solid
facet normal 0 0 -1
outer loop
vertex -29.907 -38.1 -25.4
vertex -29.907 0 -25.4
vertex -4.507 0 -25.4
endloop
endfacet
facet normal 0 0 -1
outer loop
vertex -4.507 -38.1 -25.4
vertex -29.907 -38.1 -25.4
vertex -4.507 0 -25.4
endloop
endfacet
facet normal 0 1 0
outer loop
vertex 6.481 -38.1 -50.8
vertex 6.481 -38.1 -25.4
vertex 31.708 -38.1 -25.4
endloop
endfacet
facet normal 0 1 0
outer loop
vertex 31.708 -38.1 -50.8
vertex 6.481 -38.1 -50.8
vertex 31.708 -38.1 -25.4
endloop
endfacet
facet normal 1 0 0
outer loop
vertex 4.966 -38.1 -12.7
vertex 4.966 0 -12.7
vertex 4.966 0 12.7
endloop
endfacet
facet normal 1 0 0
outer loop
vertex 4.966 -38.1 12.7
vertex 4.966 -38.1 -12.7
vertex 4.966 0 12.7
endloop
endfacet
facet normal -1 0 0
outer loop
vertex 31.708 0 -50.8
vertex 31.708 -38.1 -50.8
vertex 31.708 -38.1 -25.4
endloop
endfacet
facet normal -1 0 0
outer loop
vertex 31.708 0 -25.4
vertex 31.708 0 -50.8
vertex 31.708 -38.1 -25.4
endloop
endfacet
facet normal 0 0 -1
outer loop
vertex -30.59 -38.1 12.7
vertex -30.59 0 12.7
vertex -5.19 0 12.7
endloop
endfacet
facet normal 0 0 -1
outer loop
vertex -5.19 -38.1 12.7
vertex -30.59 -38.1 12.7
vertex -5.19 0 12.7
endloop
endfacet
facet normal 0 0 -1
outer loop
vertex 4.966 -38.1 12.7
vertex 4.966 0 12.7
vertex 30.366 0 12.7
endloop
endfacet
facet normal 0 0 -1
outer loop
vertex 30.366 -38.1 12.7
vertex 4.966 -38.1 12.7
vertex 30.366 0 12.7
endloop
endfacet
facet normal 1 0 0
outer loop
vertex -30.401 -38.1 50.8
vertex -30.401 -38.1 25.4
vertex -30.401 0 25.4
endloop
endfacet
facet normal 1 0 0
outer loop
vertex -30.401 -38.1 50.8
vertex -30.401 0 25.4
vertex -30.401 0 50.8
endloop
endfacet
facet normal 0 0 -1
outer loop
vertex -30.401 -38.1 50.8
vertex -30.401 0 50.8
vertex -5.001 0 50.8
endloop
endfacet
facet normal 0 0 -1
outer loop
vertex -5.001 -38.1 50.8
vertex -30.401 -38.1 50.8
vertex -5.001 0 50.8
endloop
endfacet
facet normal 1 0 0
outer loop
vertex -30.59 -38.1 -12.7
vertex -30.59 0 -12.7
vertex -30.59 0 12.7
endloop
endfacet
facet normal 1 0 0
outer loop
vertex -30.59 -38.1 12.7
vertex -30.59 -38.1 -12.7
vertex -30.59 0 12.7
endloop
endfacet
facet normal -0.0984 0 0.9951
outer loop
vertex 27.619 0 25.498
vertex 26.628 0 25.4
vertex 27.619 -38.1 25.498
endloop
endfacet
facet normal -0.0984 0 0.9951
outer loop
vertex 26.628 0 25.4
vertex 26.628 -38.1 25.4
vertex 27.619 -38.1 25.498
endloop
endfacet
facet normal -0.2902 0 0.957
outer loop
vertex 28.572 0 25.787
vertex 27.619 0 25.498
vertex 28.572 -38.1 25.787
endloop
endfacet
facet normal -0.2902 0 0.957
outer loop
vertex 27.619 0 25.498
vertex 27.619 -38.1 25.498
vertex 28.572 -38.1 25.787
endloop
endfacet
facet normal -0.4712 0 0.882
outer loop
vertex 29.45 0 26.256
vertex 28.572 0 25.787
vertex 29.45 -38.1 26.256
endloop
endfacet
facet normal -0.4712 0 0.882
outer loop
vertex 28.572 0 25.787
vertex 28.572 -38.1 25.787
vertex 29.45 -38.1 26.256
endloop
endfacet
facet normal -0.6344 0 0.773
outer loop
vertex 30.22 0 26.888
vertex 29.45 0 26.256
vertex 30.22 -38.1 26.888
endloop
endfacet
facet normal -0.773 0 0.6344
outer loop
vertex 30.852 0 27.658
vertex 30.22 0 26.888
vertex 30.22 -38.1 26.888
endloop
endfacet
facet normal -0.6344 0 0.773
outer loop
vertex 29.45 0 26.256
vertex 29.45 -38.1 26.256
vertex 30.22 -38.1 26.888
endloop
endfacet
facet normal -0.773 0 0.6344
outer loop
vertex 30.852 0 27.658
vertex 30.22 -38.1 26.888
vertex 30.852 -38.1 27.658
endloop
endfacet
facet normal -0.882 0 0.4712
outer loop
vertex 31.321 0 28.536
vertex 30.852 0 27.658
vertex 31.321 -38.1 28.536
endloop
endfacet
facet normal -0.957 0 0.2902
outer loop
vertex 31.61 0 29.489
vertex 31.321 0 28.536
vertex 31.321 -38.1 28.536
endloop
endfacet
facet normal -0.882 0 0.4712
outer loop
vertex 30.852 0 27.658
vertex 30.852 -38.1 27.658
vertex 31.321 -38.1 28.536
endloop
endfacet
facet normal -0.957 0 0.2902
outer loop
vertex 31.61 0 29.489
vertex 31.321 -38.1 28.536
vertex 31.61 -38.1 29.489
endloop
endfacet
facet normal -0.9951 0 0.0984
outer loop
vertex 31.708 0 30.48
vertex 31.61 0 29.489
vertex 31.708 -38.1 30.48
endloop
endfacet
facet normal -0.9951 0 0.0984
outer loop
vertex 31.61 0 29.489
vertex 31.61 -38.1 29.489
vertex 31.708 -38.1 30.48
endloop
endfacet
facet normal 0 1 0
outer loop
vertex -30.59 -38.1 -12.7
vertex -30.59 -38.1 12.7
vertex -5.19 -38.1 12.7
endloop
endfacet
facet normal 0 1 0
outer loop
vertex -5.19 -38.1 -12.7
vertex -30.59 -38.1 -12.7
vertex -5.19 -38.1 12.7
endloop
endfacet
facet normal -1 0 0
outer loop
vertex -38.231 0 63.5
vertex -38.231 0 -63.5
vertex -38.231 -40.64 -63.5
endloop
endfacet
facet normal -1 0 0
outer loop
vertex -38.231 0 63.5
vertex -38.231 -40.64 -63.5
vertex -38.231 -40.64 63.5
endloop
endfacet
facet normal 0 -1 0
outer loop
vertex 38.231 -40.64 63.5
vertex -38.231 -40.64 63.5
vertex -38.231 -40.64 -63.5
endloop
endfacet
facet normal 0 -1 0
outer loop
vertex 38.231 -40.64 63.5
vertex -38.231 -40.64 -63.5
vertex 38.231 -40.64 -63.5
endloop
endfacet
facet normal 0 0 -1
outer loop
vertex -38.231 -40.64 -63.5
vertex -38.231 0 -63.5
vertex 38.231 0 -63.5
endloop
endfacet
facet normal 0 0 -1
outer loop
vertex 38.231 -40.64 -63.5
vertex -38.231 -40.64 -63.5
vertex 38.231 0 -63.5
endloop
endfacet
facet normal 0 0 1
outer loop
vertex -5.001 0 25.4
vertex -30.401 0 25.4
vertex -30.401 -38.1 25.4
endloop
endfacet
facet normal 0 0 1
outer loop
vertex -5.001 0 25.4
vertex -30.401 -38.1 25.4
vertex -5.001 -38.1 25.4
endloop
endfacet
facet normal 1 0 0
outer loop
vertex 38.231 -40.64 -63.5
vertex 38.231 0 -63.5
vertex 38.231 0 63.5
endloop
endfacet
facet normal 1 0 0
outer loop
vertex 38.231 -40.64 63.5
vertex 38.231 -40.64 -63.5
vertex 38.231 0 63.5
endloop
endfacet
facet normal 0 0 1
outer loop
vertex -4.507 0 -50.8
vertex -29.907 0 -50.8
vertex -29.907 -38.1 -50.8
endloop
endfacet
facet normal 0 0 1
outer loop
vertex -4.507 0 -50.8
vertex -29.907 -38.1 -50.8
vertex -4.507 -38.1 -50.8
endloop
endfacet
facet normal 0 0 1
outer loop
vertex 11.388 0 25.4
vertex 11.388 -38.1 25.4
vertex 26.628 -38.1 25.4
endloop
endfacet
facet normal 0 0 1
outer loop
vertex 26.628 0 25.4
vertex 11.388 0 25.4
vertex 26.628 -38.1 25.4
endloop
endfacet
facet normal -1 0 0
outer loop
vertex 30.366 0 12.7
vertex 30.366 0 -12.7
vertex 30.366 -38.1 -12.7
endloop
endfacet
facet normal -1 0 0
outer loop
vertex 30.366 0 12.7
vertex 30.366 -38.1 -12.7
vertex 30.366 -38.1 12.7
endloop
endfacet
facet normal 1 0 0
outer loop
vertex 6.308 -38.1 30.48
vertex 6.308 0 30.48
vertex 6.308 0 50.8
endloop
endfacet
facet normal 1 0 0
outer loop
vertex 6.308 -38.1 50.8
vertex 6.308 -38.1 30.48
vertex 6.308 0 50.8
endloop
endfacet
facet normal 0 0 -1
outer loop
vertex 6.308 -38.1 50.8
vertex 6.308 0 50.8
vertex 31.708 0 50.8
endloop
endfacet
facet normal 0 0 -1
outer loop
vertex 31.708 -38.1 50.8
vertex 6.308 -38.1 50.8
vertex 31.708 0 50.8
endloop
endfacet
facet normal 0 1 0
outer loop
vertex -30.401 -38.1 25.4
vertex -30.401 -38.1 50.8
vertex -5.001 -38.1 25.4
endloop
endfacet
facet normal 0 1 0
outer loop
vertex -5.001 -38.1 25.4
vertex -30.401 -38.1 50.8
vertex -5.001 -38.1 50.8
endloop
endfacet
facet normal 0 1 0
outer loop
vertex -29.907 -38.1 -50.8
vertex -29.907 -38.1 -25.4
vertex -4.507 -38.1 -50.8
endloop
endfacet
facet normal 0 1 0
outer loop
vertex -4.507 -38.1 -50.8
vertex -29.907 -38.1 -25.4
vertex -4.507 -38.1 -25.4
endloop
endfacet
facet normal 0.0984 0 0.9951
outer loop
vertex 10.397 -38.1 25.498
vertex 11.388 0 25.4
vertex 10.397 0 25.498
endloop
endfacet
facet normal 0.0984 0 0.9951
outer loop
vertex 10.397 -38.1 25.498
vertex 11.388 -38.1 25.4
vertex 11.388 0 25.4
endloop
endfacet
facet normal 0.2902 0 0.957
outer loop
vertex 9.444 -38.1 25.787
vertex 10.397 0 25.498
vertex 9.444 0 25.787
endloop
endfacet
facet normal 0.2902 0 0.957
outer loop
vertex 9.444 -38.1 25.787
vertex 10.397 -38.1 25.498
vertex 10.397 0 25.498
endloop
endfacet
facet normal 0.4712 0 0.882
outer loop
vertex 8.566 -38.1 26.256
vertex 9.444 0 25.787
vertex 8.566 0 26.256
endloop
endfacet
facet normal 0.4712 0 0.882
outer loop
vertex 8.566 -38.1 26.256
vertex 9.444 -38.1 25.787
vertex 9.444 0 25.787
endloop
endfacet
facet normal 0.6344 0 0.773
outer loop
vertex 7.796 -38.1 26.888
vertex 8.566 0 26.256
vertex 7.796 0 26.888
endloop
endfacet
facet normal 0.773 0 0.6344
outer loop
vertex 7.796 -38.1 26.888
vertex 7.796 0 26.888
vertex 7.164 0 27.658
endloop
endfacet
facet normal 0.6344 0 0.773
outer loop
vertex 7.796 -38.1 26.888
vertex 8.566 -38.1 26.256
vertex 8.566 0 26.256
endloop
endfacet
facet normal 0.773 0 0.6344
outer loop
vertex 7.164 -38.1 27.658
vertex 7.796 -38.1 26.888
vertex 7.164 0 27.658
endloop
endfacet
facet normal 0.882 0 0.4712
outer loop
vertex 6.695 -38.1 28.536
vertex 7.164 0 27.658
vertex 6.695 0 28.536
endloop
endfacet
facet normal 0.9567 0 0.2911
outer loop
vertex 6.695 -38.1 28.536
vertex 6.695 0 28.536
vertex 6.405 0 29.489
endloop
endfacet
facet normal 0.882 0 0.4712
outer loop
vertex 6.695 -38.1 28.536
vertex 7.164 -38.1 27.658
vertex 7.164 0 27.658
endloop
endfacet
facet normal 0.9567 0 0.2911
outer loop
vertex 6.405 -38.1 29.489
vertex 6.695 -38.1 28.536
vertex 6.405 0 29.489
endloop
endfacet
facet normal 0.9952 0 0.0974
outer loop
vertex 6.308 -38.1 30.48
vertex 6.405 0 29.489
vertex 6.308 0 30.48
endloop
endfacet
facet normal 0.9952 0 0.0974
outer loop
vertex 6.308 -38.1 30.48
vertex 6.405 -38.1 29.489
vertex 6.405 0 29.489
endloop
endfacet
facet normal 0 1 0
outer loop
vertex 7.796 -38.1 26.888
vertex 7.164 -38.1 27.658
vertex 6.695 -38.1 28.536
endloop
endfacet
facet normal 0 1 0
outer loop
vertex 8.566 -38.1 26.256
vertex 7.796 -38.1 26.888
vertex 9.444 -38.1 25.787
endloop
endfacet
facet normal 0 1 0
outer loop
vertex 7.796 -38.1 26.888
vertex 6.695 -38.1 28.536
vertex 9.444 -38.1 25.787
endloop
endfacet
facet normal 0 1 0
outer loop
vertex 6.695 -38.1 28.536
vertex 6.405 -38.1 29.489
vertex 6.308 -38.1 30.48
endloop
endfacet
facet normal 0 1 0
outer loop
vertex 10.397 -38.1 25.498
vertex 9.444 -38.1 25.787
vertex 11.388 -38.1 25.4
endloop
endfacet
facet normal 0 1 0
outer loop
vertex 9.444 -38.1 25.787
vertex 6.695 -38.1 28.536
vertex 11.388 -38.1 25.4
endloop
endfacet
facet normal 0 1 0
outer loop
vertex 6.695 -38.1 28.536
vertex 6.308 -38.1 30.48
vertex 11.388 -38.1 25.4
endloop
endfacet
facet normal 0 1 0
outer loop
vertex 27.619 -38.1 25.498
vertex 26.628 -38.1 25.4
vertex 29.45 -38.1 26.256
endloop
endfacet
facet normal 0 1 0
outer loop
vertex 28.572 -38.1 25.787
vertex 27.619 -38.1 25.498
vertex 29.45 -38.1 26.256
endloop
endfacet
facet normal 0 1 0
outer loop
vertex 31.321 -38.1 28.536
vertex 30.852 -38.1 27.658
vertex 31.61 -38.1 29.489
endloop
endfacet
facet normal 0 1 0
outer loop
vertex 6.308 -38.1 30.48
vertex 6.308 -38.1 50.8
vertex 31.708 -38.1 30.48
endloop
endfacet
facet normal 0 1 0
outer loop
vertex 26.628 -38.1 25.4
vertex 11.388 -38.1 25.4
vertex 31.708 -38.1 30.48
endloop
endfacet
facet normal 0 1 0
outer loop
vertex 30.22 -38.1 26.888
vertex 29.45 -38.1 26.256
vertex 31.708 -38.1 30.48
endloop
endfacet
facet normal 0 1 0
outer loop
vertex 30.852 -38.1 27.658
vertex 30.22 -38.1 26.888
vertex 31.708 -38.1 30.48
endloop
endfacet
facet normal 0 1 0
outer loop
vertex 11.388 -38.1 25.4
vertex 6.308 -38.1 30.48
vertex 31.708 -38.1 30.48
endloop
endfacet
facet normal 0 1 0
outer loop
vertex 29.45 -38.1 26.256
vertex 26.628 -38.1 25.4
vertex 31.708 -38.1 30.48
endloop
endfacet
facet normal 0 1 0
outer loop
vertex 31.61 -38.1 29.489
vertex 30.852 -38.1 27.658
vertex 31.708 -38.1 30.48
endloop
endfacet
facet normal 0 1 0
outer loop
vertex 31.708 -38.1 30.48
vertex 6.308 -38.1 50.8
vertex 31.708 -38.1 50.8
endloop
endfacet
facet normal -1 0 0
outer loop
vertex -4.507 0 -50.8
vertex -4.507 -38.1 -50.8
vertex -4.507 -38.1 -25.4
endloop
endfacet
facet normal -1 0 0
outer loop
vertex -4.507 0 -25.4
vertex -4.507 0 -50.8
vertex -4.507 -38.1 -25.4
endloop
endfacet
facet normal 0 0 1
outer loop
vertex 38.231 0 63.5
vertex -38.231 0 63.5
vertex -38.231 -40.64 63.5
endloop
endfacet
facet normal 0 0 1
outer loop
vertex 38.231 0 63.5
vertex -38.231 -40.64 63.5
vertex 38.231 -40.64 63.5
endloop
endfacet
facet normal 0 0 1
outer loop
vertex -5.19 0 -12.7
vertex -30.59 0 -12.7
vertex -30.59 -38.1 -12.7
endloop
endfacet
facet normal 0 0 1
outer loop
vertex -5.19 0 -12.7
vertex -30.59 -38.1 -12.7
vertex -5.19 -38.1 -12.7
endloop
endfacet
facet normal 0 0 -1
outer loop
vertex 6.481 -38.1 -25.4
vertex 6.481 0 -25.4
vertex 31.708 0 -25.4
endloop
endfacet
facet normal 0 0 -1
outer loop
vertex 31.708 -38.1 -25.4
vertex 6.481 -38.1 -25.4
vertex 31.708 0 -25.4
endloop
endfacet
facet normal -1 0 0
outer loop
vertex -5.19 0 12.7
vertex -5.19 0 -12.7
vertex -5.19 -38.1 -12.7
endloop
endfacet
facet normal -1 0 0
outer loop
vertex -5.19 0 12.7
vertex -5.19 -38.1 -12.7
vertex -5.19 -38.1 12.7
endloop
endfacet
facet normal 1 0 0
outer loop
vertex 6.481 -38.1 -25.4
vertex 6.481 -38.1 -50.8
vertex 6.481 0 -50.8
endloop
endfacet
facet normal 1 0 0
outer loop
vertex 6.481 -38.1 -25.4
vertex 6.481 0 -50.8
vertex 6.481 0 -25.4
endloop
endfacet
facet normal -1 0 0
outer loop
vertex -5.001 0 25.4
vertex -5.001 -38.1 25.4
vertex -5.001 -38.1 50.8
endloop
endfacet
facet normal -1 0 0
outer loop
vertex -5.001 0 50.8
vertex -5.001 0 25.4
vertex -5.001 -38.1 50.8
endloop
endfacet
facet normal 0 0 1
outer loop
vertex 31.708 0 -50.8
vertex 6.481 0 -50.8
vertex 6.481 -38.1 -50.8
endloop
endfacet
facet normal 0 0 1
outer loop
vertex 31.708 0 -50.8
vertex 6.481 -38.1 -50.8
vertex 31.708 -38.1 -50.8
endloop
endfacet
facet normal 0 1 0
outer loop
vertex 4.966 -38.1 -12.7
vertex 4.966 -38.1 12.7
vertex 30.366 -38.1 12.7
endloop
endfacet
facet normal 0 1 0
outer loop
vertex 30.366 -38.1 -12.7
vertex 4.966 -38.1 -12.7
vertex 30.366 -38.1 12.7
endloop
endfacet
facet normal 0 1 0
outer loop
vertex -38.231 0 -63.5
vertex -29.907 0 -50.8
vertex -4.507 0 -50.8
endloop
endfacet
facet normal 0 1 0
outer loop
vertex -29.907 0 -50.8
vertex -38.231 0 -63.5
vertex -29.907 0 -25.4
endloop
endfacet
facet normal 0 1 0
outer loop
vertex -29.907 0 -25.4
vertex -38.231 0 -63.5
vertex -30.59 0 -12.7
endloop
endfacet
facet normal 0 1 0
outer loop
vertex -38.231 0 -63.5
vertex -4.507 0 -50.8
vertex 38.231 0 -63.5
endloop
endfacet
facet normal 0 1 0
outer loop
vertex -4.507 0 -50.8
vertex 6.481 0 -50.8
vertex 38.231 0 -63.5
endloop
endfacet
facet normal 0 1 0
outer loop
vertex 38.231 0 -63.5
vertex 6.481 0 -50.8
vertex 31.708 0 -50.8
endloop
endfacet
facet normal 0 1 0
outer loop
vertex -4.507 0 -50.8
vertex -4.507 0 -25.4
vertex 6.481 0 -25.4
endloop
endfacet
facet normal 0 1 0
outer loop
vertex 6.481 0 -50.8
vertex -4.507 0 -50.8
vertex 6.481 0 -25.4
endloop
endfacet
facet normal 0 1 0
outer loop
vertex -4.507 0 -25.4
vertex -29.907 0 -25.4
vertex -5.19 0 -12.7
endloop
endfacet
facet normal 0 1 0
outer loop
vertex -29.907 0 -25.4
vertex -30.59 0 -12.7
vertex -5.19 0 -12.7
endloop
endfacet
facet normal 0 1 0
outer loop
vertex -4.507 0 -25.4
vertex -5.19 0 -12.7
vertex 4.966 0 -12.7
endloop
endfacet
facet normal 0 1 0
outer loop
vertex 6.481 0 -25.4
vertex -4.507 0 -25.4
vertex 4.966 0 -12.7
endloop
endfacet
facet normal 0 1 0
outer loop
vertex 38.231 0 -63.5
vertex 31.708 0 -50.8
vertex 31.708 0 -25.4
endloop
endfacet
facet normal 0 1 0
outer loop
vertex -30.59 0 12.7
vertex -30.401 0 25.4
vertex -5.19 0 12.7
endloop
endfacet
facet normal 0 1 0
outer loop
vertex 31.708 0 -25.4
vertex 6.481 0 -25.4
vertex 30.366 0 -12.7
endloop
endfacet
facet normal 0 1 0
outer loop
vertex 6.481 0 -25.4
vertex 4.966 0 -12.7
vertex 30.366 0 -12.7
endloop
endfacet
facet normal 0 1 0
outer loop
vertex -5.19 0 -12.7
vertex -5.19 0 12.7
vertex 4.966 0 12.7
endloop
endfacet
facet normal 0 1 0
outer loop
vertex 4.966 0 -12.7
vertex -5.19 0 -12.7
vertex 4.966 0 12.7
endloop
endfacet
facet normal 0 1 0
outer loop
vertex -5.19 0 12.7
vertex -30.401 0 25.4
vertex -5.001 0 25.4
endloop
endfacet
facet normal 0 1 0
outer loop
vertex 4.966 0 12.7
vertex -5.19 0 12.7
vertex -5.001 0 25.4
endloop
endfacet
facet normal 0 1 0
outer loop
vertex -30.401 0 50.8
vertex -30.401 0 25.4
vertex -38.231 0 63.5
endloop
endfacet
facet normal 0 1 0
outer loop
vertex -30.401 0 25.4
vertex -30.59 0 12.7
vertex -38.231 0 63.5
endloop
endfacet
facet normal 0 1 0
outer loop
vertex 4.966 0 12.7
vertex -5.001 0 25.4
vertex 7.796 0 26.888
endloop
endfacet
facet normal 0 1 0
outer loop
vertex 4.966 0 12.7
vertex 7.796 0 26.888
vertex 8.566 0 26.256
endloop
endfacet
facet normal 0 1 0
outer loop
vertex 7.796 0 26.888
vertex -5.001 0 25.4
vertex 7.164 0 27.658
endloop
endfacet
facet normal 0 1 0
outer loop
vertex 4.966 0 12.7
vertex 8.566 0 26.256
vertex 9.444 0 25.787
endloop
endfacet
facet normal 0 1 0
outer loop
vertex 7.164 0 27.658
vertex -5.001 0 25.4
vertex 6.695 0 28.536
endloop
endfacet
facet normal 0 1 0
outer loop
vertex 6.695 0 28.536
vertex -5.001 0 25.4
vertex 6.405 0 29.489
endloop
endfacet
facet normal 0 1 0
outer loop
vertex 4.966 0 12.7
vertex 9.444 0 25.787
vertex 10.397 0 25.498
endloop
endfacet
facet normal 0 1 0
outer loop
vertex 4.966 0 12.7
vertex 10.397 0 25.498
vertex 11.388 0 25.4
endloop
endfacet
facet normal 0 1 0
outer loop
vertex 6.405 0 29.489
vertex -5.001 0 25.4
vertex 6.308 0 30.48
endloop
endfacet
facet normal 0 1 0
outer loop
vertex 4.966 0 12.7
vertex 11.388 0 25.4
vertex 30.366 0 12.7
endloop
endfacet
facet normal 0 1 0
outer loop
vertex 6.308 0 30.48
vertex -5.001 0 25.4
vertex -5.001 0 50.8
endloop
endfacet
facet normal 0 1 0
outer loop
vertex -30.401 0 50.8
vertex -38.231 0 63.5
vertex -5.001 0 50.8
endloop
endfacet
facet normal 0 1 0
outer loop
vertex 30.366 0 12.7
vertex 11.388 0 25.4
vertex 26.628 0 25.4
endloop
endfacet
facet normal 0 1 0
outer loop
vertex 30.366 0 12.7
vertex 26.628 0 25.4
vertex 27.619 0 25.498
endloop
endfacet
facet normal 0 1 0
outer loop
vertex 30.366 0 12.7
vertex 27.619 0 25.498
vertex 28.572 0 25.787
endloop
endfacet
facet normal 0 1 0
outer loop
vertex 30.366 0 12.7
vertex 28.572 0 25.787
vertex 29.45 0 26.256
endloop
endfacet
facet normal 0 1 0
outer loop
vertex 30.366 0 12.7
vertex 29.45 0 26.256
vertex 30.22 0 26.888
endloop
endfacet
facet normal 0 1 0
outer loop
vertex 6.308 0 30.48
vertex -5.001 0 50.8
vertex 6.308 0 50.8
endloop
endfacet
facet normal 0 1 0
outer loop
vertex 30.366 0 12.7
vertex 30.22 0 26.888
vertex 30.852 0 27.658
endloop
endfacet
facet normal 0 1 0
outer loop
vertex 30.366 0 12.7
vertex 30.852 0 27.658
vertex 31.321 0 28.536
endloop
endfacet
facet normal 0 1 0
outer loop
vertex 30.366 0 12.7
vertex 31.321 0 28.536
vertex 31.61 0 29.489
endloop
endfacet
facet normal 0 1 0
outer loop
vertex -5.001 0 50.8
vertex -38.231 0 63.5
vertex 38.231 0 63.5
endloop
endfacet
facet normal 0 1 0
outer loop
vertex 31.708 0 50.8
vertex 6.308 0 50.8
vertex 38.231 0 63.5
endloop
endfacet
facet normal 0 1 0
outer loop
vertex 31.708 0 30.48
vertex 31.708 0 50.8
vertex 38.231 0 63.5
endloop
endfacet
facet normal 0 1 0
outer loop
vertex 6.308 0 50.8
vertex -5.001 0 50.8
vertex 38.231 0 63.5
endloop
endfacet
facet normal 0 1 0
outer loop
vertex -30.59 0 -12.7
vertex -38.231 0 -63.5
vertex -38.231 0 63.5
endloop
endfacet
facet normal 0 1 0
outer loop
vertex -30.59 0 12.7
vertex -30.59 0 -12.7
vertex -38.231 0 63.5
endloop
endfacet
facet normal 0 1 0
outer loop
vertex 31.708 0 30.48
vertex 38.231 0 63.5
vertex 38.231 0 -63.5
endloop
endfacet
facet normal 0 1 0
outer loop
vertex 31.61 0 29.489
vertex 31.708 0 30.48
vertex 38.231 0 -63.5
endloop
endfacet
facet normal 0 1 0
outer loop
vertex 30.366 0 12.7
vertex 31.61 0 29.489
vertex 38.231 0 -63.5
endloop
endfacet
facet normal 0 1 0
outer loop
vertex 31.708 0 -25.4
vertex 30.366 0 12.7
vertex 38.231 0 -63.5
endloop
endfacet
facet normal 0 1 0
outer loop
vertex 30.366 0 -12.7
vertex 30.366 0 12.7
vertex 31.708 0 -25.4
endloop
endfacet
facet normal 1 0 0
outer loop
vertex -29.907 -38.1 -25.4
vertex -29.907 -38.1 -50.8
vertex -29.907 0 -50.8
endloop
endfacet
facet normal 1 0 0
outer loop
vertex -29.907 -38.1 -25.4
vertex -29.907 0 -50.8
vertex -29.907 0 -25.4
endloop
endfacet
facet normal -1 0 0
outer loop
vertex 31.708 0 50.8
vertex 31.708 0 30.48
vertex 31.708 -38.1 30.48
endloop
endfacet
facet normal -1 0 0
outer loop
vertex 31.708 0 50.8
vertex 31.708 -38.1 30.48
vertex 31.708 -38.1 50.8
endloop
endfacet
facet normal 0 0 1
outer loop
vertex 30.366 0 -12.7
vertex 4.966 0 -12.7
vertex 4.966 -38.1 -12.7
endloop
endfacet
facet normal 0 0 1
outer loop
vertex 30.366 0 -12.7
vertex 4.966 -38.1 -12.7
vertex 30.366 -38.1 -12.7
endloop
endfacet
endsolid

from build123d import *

# Parameters (mm, degrees)
F0_W     = 76.46276
F0_H     = 127
F2_DEPTH = 40.64
F1_W     = 25.4
F1_H     = 25.4
F1_W_2   = 25.226503
F3_DEPTH = 38.1
F4_R     = 5.08


with BuildPart() as f2:
    # F0 (on Front) → F2 (new body)
    with BuildSketch(Plane.XZ):
        Rectangle(F0_W, F0_H)
    extrude(amount=F2_DEPTH)

    # F1 (on face) → F3 (cut)
    with BuildSketch(Plane.XZ):
        with Locations((-17.70053, 38.1)):
            Rectangle(F1_W, F1_H)
        with Locations((19.007883, 38.1)):
            Rectangle(F1_W, F1_H)
        with Locations((17.666091, 0)):
            Rectangle(F1_W, F1_H)
        with Locations((-17.890041, 0)):
            Rectangle(F1_W, F1_H)
        with Locations((-17.206696, -38.1)):
            Rectangle(F1_W, F1_H)
        with Locations((19.094631, -38.1)):
            Rectangle(F1_W_2, F1_H)
    extrude(amount=F3_DEPTH, mode=Mode.SUBTRACT)

    # F4
    f4_edges = [f2.edges().sort_by_distance(p)[0] for p in [
        (6.307883, -19.05, 25.4),
        (31.707883, -19.05, 25.4),
    ]]
    fillet(f4_edges, radius=F4_R)


solid = f2.part
